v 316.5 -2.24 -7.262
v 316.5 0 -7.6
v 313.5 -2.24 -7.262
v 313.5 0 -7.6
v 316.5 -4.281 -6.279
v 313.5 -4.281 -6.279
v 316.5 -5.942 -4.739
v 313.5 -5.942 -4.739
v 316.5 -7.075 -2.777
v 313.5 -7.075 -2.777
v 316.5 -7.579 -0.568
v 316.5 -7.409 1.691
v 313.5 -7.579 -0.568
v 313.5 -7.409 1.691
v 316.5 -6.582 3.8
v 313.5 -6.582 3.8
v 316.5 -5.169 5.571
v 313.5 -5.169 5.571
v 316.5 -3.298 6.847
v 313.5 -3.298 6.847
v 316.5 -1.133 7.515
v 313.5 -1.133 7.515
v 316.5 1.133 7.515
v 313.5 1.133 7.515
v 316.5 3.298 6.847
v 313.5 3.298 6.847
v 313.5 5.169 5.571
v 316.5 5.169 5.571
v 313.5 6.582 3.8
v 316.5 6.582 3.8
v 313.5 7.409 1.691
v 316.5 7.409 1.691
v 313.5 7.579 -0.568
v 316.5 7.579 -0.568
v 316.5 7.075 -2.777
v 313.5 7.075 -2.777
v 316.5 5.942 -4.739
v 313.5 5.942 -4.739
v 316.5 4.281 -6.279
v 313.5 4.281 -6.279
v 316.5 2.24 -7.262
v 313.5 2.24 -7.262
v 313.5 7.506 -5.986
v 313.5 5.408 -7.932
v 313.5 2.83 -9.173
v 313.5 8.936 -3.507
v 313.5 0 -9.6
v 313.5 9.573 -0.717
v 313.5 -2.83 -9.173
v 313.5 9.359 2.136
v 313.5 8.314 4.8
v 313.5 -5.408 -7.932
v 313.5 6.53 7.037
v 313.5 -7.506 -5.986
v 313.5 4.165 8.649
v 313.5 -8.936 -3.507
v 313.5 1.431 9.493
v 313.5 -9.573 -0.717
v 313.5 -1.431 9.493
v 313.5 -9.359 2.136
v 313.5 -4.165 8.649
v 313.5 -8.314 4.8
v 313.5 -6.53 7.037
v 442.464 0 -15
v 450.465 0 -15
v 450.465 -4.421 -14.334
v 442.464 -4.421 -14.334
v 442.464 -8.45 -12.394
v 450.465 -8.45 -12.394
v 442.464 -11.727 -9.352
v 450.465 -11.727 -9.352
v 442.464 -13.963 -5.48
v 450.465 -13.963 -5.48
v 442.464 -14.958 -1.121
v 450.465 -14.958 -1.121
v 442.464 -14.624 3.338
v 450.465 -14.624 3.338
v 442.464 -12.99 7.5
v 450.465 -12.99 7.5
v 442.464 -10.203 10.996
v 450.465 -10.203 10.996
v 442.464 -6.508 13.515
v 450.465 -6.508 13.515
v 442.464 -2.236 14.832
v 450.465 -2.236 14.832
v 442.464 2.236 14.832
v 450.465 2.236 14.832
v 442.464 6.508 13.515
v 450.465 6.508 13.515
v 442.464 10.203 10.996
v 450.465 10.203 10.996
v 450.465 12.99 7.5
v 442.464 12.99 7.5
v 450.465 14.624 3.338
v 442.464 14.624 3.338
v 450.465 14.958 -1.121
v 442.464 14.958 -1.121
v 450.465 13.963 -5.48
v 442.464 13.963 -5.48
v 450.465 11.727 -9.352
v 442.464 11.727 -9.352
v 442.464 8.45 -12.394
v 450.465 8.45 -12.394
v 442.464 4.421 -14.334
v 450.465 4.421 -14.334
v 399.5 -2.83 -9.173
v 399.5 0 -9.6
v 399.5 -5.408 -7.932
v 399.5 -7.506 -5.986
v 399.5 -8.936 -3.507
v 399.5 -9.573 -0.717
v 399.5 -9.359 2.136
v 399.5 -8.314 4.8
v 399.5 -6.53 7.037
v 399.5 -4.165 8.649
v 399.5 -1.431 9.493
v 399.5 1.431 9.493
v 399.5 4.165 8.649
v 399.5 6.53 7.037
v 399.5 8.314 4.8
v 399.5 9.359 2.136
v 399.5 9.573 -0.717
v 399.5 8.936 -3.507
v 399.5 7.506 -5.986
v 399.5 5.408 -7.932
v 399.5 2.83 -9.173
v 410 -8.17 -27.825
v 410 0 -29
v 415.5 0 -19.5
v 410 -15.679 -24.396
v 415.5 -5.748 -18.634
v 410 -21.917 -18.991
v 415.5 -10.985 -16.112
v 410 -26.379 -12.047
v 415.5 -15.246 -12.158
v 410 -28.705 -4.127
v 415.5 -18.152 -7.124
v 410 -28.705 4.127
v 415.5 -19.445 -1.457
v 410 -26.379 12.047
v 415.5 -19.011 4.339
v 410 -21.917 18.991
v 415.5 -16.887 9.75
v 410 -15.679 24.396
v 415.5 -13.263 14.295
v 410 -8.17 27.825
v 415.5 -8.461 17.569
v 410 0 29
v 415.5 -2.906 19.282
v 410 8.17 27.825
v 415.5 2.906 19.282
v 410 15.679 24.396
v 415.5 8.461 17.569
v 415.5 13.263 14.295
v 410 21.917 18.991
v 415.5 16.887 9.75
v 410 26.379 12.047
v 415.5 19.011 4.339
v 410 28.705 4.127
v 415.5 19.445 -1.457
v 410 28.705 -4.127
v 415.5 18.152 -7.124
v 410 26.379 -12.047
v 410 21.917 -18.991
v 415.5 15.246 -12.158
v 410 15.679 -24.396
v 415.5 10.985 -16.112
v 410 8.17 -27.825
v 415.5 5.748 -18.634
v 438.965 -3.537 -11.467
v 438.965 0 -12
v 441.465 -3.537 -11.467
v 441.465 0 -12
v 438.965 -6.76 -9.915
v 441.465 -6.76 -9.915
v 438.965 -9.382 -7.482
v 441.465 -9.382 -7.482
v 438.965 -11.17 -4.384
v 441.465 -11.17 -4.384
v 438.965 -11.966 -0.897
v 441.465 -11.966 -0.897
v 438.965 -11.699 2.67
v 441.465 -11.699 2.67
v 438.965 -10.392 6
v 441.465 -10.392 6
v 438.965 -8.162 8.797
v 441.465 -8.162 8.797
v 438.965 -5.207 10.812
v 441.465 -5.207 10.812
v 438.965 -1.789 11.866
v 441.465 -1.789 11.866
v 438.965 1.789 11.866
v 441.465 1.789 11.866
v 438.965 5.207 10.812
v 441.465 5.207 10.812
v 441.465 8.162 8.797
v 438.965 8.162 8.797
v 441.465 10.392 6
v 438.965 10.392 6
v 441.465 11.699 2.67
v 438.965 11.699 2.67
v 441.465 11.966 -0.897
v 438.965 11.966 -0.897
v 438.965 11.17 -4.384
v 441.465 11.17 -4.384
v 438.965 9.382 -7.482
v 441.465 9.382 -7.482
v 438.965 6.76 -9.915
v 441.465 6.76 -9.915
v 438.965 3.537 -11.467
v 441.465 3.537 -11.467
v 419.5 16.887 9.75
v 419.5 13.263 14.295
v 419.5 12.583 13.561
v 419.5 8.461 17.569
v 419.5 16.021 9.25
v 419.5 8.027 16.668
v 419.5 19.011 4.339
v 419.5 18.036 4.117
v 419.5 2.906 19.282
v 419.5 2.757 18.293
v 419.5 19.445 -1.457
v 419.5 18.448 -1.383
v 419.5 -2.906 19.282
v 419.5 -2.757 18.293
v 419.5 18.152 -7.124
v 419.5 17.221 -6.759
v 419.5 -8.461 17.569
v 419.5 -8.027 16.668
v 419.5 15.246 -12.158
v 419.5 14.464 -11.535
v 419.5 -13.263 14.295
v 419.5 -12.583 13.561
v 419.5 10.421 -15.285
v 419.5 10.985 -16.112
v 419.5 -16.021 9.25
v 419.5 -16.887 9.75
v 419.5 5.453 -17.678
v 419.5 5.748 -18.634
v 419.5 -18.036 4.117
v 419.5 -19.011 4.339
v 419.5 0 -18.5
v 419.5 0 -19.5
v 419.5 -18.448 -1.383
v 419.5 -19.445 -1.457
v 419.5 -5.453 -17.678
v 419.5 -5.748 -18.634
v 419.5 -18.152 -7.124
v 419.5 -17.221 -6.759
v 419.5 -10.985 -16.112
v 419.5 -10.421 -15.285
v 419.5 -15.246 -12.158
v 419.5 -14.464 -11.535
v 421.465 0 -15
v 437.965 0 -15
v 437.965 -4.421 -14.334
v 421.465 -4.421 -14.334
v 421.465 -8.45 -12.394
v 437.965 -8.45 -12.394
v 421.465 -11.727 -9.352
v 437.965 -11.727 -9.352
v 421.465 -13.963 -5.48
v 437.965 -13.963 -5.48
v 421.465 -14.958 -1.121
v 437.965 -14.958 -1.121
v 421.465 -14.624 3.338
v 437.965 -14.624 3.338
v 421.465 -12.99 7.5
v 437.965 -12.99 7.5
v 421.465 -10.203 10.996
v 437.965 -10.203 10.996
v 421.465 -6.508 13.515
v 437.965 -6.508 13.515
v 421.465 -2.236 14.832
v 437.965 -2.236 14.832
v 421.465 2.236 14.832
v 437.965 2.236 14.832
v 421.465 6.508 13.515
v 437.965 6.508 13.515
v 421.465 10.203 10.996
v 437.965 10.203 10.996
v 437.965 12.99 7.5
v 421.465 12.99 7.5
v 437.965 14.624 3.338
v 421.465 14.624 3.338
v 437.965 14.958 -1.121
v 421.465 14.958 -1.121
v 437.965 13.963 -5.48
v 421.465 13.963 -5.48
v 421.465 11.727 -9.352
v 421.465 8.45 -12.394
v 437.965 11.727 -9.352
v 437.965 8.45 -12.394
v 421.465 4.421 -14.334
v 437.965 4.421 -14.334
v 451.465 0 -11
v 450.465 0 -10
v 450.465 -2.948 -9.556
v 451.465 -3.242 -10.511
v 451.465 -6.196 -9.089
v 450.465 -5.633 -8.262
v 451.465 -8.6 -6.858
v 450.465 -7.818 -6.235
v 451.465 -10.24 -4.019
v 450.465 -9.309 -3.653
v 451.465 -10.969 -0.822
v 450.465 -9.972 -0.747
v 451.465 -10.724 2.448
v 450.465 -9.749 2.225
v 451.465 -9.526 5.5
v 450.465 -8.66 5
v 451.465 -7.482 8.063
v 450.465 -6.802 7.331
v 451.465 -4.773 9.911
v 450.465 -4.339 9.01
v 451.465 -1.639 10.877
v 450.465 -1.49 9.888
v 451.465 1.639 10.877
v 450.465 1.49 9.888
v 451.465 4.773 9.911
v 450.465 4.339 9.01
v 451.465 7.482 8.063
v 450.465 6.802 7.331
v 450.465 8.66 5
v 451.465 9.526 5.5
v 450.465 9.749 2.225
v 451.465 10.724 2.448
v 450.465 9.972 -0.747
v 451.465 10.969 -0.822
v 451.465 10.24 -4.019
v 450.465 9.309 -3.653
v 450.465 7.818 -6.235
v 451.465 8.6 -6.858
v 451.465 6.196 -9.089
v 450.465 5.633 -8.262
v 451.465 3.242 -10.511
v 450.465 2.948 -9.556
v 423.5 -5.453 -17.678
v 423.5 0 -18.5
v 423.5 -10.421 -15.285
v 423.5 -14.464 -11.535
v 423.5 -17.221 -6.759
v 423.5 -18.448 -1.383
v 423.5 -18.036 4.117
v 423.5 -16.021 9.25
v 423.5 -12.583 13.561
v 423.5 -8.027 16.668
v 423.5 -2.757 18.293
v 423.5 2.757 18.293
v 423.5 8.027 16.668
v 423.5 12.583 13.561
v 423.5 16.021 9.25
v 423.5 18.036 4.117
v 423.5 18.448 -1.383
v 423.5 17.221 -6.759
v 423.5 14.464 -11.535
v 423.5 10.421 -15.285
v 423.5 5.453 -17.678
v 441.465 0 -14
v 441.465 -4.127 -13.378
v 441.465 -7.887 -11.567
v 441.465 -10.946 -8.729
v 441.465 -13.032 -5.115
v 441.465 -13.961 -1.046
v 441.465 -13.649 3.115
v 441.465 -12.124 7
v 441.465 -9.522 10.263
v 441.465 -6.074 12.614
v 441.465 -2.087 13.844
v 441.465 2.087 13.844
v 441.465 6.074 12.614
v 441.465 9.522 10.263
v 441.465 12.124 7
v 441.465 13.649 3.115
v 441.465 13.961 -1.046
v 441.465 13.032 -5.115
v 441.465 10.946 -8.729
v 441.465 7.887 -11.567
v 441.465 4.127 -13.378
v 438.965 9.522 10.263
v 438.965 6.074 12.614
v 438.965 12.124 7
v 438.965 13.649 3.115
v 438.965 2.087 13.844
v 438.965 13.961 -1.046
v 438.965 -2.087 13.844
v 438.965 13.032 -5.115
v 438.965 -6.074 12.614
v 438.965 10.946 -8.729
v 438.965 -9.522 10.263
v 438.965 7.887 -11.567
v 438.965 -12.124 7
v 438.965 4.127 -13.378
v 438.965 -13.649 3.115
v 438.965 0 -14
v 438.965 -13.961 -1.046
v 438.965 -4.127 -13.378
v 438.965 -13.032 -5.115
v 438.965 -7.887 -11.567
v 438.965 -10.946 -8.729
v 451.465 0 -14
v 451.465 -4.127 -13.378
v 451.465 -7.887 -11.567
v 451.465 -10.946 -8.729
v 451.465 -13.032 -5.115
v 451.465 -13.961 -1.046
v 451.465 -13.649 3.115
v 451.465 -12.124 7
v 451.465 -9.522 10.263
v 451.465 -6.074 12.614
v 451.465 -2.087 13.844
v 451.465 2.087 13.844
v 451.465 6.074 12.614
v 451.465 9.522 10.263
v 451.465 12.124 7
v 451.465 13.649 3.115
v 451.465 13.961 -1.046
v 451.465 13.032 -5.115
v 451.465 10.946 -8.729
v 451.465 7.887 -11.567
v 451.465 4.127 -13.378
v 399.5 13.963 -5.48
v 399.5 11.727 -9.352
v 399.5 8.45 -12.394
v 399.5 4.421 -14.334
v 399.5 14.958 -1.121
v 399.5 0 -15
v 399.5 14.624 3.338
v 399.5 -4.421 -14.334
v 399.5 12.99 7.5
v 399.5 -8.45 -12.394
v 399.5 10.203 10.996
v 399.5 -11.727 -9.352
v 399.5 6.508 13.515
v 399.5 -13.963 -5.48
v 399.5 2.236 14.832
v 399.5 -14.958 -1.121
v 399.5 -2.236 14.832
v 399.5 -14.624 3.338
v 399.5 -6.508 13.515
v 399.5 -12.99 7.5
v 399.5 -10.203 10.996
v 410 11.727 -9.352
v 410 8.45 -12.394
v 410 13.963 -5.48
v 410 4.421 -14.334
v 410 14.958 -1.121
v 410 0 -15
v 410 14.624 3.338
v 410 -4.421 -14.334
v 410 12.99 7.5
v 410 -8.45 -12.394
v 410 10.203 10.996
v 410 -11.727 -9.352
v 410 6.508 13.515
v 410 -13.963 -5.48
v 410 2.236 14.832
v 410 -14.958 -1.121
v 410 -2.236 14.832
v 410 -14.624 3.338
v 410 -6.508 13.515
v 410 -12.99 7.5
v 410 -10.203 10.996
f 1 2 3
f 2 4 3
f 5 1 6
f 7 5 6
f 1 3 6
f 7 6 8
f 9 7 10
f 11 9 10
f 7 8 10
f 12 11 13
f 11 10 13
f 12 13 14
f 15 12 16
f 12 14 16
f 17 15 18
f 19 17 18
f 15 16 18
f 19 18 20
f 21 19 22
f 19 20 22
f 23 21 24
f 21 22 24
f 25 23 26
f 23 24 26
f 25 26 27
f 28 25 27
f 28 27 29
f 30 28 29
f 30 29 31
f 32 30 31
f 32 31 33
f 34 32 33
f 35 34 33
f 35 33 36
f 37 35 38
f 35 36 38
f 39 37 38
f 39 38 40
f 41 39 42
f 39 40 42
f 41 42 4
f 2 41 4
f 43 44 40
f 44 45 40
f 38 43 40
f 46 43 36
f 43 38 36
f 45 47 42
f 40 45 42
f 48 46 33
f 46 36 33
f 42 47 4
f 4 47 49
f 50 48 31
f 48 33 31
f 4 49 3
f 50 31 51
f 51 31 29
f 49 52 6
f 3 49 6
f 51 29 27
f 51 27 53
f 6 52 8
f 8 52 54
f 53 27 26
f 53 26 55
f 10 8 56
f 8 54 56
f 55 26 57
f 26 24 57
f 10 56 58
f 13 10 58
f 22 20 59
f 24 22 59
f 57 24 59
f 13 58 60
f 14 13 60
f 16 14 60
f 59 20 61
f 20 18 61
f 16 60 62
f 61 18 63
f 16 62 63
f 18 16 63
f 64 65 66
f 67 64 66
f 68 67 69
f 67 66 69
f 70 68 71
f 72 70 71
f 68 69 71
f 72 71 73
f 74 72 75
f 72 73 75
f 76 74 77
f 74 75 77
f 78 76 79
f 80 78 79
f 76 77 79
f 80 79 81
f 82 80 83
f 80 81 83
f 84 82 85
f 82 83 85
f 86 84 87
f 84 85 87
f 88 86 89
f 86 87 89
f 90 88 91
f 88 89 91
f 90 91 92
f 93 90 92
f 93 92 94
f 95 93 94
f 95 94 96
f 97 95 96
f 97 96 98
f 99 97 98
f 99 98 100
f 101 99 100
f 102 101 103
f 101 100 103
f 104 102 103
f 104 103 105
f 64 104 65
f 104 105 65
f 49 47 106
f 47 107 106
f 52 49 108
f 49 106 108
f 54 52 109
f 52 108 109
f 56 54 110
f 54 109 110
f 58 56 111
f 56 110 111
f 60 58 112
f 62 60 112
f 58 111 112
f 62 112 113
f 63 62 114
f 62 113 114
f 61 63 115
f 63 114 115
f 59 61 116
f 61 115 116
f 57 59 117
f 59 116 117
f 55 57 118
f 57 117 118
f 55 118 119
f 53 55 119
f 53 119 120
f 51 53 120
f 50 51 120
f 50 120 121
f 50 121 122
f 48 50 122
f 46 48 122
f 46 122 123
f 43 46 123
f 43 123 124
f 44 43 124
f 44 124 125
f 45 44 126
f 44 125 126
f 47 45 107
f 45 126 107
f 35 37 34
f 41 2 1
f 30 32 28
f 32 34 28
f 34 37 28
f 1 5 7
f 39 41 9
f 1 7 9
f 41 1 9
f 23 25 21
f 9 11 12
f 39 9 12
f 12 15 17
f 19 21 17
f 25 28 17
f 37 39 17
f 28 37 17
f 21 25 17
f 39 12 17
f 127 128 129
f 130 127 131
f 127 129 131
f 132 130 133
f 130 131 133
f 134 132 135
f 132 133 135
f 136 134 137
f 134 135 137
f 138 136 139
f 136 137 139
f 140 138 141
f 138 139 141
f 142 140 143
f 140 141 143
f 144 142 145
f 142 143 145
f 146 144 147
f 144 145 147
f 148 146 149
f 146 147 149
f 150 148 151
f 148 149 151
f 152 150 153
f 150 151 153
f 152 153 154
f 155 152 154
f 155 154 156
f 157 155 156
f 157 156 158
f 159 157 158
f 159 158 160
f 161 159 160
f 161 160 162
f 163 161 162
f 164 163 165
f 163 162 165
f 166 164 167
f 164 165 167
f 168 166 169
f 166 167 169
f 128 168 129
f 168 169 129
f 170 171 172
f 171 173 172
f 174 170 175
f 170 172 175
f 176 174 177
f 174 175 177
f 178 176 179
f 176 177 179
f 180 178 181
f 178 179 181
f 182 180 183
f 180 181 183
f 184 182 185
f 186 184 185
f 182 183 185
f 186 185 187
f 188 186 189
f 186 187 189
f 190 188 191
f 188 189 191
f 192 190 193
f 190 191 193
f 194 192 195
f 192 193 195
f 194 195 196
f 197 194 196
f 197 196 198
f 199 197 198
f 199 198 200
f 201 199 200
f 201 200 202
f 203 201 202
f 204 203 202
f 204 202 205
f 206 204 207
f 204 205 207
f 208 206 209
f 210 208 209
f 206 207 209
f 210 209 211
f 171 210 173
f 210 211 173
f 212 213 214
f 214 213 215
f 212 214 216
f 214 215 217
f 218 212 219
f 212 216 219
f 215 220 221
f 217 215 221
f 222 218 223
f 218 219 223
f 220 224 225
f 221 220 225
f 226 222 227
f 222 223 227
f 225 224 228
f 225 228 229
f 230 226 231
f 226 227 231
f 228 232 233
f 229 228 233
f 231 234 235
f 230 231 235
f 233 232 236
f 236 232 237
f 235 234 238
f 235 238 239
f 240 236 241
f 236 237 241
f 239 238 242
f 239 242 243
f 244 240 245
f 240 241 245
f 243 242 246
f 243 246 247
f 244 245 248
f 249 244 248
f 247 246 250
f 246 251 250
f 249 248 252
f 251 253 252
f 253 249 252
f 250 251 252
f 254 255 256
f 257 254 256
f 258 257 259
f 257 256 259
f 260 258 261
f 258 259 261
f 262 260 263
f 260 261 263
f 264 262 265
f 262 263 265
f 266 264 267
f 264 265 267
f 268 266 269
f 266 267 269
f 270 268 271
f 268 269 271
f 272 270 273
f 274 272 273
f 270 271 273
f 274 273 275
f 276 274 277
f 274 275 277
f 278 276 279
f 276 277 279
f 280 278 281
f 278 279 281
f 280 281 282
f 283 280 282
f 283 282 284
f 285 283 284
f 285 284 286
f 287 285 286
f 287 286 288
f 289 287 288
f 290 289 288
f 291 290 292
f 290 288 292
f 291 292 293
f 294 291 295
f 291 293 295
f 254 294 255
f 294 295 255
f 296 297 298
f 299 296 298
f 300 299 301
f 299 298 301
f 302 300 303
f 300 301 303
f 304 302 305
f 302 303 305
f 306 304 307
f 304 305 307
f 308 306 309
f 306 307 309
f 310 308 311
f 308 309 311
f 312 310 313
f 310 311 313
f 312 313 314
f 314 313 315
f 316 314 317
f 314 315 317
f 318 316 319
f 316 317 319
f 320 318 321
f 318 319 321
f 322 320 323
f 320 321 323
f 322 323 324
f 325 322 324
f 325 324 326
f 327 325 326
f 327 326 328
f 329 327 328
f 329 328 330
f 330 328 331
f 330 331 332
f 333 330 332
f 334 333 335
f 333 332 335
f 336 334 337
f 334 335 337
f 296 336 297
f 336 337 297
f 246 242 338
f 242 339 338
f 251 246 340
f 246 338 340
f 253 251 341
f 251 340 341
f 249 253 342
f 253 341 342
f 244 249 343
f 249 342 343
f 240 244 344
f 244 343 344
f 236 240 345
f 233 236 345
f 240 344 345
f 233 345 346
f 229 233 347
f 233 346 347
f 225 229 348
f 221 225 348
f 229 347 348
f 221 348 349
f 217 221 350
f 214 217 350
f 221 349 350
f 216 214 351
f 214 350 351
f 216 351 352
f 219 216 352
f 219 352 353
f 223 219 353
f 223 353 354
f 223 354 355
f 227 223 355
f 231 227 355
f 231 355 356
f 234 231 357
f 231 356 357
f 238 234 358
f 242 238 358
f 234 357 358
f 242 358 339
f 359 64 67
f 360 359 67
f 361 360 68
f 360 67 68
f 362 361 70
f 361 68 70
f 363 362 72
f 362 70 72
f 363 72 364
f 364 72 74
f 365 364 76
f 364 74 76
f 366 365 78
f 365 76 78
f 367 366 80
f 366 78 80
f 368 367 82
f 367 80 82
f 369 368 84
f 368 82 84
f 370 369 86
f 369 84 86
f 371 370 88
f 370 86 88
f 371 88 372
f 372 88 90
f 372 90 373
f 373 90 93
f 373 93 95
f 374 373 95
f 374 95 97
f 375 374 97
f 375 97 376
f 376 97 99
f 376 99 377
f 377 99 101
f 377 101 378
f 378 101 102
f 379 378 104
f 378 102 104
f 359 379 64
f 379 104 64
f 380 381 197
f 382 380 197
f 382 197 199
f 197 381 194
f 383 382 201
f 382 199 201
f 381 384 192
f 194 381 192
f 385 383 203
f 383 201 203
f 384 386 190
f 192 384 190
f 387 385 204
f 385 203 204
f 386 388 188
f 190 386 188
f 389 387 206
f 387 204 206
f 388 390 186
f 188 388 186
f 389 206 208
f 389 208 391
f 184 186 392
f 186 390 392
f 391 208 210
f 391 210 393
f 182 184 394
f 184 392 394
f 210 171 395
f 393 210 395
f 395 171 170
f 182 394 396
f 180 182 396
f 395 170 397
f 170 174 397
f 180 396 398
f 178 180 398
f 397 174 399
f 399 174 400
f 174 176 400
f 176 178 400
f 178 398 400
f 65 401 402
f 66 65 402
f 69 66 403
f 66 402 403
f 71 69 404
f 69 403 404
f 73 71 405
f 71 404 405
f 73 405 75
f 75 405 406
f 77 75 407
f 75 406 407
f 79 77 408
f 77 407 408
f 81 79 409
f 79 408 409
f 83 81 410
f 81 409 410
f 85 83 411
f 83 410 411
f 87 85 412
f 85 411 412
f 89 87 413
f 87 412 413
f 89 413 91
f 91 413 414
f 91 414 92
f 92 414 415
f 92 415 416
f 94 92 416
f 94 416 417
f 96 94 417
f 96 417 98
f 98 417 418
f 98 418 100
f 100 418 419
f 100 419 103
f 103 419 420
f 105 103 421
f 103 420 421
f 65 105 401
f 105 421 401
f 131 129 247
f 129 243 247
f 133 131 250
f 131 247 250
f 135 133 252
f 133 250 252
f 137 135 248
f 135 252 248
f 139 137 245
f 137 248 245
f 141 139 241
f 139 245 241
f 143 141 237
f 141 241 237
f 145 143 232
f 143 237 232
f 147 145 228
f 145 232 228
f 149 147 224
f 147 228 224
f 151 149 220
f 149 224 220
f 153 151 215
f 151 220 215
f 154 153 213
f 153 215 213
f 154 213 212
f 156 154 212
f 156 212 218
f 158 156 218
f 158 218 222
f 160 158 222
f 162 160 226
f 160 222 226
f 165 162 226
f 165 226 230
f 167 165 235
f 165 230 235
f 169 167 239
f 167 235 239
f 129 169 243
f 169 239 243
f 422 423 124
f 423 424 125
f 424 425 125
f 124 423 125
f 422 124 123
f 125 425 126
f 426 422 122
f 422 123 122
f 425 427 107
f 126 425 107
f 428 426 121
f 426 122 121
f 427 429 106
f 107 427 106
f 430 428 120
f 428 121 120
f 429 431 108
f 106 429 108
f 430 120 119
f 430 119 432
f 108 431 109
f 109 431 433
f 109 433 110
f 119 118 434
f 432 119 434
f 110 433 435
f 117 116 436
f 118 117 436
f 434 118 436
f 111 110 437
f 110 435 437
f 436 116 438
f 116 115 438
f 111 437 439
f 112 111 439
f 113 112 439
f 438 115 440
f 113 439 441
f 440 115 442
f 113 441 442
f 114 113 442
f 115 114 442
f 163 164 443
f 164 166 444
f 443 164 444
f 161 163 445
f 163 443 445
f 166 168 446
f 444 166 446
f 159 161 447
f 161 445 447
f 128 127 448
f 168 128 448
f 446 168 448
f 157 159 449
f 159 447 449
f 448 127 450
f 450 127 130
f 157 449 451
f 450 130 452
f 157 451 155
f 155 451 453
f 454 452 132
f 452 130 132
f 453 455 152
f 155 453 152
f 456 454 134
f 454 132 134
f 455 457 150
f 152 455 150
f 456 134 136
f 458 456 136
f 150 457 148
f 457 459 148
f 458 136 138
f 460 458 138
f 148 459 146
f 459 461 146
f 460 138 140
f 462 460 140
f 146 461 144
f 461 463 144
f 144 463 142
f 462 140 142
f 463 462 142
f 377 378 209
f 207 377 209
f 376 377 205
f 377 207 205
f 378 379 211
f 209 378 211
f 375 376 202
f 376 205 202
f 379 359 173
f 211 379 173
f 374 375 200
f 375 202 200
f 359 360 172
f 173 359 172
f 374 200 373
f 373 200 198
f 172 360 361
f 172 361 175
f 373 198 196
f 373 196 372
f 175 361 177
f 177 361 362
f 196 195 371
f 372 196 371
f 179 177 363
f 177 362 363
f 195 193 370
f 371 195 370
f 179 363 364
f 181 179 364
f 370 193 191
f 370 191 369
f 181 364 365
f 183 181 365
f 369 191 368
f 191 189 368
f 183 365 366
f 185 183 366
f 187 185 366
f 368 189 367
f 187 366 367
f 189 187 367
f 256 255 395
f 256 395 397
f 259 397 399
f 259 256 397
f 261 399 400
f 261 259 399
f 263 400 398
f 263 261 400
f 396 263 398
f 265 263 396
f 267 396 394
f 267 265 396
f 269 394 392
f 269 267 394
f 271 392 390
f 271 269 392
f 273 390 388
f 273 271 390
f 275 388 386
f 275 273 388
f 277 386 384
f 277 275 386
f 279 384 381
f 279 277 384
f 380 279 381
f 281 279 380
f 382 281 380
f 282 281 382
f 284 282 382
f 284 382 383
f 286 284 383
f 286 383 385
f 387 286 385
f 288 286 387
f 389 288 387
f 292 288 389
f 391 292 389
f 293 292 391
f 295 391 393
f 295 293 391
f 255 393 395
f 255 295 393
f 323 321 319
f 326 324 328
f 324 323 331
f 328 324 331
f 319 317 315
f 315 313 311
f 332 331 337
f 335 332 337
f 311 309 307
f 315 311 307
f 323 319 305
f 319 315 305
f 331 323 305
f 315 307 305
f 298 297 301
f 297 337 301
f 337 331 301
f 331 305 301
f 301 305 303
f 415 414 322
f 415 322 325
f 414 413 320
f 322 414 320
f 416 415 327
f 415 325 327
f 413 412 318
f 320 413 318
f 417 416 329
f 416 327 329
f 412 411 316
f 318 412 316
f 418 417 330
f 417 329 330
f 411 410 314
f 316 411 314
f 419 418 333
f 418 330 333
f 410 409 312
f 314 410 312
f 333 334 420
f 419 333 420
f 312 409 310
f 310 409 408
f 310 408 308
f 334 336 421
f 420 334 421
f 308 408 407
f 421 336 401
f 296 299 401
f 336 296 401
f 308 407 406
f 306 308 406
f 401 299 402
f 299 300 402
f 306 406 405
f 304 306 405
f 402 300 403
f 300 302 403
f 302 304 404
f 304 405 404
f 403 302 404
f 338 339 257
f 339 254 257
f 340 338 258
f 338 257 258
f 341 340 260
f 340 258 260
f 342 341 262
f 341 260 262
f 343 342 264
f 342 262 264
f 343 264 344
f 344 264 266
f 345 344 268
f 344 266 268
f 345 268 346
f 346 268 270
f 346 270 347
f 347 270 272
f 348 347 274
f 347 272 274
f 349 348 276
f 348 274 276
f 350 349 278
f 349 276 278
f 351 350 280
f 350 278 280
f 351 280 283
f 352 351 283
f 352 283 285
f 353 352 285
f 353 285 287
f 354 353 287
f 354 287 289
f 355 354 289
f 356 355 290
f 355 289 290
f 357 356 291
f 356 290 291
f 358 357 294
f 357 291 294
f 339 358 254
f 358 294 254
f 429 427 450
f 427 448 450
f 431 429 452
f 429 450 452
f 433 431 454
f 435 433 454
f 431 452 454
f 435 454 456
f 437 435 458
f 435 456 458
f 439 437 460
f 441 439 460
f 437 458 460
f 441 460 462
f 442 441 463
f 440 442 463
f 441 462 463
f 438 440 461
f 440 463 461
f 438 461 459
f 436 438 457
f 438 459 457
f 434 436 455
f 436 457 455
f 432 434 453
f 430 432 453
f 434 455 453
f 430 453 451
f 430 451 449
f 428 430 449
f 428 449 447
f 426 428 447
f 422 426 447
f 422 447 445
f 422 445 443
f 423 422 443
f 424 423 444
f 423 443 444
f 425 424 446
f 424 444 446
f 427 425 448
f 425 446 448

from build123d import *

# Parameters (mm, degrees)
CHANFREIN1_SIZE = 1


with BuildPart() as part:
    # Esquisse1 → Révolution2 (revolve)
    with BuildSketch(Plane.XY, mode=Mode.PRIVATE) as r_volution2_sk:
        Polygon((438.964577225, -15), (438.964577225, -12), (441.464577225, -12), (441.464577225, -15), (451.464577225, -15), (451.464577225, -10), (450.464577225, -10), (450.464577225, 0), (316.5, 0), (316.5, -7.6), (313.5, -7.6), (313.5, -9.6), (399.5, -9.6), (399.5, -15), (410, -15), (410, -29), (415.5, -19.5), (419.5, -19.5), (419.5, -18.5), (423.5, -18.5), (421.464577225, -15), align=None)
    revolve(r_volution2_sk.sketch.rotate(Axis((313.5, 0, 0), (-1, 0, 0)), 270), axis=Axis((313.5, 0, 0), (-1, 0, 0)))

    # Chanfrein1
    chanfrein1_edges = [part.edges().sort_by_distance(p)[0] for p in [
        (438.964577225, 0, 15),
        (441.464577225, 0, 15),
        (451.464577225, 0, 15),
        (451.464577225, 0, 10),
    ]]
    chamfer(chanfrein1_edges, length=CHANFREIN1_SIZE - 0.0001)  # a hair under: the kernel refuses the full size


solid = part.part
